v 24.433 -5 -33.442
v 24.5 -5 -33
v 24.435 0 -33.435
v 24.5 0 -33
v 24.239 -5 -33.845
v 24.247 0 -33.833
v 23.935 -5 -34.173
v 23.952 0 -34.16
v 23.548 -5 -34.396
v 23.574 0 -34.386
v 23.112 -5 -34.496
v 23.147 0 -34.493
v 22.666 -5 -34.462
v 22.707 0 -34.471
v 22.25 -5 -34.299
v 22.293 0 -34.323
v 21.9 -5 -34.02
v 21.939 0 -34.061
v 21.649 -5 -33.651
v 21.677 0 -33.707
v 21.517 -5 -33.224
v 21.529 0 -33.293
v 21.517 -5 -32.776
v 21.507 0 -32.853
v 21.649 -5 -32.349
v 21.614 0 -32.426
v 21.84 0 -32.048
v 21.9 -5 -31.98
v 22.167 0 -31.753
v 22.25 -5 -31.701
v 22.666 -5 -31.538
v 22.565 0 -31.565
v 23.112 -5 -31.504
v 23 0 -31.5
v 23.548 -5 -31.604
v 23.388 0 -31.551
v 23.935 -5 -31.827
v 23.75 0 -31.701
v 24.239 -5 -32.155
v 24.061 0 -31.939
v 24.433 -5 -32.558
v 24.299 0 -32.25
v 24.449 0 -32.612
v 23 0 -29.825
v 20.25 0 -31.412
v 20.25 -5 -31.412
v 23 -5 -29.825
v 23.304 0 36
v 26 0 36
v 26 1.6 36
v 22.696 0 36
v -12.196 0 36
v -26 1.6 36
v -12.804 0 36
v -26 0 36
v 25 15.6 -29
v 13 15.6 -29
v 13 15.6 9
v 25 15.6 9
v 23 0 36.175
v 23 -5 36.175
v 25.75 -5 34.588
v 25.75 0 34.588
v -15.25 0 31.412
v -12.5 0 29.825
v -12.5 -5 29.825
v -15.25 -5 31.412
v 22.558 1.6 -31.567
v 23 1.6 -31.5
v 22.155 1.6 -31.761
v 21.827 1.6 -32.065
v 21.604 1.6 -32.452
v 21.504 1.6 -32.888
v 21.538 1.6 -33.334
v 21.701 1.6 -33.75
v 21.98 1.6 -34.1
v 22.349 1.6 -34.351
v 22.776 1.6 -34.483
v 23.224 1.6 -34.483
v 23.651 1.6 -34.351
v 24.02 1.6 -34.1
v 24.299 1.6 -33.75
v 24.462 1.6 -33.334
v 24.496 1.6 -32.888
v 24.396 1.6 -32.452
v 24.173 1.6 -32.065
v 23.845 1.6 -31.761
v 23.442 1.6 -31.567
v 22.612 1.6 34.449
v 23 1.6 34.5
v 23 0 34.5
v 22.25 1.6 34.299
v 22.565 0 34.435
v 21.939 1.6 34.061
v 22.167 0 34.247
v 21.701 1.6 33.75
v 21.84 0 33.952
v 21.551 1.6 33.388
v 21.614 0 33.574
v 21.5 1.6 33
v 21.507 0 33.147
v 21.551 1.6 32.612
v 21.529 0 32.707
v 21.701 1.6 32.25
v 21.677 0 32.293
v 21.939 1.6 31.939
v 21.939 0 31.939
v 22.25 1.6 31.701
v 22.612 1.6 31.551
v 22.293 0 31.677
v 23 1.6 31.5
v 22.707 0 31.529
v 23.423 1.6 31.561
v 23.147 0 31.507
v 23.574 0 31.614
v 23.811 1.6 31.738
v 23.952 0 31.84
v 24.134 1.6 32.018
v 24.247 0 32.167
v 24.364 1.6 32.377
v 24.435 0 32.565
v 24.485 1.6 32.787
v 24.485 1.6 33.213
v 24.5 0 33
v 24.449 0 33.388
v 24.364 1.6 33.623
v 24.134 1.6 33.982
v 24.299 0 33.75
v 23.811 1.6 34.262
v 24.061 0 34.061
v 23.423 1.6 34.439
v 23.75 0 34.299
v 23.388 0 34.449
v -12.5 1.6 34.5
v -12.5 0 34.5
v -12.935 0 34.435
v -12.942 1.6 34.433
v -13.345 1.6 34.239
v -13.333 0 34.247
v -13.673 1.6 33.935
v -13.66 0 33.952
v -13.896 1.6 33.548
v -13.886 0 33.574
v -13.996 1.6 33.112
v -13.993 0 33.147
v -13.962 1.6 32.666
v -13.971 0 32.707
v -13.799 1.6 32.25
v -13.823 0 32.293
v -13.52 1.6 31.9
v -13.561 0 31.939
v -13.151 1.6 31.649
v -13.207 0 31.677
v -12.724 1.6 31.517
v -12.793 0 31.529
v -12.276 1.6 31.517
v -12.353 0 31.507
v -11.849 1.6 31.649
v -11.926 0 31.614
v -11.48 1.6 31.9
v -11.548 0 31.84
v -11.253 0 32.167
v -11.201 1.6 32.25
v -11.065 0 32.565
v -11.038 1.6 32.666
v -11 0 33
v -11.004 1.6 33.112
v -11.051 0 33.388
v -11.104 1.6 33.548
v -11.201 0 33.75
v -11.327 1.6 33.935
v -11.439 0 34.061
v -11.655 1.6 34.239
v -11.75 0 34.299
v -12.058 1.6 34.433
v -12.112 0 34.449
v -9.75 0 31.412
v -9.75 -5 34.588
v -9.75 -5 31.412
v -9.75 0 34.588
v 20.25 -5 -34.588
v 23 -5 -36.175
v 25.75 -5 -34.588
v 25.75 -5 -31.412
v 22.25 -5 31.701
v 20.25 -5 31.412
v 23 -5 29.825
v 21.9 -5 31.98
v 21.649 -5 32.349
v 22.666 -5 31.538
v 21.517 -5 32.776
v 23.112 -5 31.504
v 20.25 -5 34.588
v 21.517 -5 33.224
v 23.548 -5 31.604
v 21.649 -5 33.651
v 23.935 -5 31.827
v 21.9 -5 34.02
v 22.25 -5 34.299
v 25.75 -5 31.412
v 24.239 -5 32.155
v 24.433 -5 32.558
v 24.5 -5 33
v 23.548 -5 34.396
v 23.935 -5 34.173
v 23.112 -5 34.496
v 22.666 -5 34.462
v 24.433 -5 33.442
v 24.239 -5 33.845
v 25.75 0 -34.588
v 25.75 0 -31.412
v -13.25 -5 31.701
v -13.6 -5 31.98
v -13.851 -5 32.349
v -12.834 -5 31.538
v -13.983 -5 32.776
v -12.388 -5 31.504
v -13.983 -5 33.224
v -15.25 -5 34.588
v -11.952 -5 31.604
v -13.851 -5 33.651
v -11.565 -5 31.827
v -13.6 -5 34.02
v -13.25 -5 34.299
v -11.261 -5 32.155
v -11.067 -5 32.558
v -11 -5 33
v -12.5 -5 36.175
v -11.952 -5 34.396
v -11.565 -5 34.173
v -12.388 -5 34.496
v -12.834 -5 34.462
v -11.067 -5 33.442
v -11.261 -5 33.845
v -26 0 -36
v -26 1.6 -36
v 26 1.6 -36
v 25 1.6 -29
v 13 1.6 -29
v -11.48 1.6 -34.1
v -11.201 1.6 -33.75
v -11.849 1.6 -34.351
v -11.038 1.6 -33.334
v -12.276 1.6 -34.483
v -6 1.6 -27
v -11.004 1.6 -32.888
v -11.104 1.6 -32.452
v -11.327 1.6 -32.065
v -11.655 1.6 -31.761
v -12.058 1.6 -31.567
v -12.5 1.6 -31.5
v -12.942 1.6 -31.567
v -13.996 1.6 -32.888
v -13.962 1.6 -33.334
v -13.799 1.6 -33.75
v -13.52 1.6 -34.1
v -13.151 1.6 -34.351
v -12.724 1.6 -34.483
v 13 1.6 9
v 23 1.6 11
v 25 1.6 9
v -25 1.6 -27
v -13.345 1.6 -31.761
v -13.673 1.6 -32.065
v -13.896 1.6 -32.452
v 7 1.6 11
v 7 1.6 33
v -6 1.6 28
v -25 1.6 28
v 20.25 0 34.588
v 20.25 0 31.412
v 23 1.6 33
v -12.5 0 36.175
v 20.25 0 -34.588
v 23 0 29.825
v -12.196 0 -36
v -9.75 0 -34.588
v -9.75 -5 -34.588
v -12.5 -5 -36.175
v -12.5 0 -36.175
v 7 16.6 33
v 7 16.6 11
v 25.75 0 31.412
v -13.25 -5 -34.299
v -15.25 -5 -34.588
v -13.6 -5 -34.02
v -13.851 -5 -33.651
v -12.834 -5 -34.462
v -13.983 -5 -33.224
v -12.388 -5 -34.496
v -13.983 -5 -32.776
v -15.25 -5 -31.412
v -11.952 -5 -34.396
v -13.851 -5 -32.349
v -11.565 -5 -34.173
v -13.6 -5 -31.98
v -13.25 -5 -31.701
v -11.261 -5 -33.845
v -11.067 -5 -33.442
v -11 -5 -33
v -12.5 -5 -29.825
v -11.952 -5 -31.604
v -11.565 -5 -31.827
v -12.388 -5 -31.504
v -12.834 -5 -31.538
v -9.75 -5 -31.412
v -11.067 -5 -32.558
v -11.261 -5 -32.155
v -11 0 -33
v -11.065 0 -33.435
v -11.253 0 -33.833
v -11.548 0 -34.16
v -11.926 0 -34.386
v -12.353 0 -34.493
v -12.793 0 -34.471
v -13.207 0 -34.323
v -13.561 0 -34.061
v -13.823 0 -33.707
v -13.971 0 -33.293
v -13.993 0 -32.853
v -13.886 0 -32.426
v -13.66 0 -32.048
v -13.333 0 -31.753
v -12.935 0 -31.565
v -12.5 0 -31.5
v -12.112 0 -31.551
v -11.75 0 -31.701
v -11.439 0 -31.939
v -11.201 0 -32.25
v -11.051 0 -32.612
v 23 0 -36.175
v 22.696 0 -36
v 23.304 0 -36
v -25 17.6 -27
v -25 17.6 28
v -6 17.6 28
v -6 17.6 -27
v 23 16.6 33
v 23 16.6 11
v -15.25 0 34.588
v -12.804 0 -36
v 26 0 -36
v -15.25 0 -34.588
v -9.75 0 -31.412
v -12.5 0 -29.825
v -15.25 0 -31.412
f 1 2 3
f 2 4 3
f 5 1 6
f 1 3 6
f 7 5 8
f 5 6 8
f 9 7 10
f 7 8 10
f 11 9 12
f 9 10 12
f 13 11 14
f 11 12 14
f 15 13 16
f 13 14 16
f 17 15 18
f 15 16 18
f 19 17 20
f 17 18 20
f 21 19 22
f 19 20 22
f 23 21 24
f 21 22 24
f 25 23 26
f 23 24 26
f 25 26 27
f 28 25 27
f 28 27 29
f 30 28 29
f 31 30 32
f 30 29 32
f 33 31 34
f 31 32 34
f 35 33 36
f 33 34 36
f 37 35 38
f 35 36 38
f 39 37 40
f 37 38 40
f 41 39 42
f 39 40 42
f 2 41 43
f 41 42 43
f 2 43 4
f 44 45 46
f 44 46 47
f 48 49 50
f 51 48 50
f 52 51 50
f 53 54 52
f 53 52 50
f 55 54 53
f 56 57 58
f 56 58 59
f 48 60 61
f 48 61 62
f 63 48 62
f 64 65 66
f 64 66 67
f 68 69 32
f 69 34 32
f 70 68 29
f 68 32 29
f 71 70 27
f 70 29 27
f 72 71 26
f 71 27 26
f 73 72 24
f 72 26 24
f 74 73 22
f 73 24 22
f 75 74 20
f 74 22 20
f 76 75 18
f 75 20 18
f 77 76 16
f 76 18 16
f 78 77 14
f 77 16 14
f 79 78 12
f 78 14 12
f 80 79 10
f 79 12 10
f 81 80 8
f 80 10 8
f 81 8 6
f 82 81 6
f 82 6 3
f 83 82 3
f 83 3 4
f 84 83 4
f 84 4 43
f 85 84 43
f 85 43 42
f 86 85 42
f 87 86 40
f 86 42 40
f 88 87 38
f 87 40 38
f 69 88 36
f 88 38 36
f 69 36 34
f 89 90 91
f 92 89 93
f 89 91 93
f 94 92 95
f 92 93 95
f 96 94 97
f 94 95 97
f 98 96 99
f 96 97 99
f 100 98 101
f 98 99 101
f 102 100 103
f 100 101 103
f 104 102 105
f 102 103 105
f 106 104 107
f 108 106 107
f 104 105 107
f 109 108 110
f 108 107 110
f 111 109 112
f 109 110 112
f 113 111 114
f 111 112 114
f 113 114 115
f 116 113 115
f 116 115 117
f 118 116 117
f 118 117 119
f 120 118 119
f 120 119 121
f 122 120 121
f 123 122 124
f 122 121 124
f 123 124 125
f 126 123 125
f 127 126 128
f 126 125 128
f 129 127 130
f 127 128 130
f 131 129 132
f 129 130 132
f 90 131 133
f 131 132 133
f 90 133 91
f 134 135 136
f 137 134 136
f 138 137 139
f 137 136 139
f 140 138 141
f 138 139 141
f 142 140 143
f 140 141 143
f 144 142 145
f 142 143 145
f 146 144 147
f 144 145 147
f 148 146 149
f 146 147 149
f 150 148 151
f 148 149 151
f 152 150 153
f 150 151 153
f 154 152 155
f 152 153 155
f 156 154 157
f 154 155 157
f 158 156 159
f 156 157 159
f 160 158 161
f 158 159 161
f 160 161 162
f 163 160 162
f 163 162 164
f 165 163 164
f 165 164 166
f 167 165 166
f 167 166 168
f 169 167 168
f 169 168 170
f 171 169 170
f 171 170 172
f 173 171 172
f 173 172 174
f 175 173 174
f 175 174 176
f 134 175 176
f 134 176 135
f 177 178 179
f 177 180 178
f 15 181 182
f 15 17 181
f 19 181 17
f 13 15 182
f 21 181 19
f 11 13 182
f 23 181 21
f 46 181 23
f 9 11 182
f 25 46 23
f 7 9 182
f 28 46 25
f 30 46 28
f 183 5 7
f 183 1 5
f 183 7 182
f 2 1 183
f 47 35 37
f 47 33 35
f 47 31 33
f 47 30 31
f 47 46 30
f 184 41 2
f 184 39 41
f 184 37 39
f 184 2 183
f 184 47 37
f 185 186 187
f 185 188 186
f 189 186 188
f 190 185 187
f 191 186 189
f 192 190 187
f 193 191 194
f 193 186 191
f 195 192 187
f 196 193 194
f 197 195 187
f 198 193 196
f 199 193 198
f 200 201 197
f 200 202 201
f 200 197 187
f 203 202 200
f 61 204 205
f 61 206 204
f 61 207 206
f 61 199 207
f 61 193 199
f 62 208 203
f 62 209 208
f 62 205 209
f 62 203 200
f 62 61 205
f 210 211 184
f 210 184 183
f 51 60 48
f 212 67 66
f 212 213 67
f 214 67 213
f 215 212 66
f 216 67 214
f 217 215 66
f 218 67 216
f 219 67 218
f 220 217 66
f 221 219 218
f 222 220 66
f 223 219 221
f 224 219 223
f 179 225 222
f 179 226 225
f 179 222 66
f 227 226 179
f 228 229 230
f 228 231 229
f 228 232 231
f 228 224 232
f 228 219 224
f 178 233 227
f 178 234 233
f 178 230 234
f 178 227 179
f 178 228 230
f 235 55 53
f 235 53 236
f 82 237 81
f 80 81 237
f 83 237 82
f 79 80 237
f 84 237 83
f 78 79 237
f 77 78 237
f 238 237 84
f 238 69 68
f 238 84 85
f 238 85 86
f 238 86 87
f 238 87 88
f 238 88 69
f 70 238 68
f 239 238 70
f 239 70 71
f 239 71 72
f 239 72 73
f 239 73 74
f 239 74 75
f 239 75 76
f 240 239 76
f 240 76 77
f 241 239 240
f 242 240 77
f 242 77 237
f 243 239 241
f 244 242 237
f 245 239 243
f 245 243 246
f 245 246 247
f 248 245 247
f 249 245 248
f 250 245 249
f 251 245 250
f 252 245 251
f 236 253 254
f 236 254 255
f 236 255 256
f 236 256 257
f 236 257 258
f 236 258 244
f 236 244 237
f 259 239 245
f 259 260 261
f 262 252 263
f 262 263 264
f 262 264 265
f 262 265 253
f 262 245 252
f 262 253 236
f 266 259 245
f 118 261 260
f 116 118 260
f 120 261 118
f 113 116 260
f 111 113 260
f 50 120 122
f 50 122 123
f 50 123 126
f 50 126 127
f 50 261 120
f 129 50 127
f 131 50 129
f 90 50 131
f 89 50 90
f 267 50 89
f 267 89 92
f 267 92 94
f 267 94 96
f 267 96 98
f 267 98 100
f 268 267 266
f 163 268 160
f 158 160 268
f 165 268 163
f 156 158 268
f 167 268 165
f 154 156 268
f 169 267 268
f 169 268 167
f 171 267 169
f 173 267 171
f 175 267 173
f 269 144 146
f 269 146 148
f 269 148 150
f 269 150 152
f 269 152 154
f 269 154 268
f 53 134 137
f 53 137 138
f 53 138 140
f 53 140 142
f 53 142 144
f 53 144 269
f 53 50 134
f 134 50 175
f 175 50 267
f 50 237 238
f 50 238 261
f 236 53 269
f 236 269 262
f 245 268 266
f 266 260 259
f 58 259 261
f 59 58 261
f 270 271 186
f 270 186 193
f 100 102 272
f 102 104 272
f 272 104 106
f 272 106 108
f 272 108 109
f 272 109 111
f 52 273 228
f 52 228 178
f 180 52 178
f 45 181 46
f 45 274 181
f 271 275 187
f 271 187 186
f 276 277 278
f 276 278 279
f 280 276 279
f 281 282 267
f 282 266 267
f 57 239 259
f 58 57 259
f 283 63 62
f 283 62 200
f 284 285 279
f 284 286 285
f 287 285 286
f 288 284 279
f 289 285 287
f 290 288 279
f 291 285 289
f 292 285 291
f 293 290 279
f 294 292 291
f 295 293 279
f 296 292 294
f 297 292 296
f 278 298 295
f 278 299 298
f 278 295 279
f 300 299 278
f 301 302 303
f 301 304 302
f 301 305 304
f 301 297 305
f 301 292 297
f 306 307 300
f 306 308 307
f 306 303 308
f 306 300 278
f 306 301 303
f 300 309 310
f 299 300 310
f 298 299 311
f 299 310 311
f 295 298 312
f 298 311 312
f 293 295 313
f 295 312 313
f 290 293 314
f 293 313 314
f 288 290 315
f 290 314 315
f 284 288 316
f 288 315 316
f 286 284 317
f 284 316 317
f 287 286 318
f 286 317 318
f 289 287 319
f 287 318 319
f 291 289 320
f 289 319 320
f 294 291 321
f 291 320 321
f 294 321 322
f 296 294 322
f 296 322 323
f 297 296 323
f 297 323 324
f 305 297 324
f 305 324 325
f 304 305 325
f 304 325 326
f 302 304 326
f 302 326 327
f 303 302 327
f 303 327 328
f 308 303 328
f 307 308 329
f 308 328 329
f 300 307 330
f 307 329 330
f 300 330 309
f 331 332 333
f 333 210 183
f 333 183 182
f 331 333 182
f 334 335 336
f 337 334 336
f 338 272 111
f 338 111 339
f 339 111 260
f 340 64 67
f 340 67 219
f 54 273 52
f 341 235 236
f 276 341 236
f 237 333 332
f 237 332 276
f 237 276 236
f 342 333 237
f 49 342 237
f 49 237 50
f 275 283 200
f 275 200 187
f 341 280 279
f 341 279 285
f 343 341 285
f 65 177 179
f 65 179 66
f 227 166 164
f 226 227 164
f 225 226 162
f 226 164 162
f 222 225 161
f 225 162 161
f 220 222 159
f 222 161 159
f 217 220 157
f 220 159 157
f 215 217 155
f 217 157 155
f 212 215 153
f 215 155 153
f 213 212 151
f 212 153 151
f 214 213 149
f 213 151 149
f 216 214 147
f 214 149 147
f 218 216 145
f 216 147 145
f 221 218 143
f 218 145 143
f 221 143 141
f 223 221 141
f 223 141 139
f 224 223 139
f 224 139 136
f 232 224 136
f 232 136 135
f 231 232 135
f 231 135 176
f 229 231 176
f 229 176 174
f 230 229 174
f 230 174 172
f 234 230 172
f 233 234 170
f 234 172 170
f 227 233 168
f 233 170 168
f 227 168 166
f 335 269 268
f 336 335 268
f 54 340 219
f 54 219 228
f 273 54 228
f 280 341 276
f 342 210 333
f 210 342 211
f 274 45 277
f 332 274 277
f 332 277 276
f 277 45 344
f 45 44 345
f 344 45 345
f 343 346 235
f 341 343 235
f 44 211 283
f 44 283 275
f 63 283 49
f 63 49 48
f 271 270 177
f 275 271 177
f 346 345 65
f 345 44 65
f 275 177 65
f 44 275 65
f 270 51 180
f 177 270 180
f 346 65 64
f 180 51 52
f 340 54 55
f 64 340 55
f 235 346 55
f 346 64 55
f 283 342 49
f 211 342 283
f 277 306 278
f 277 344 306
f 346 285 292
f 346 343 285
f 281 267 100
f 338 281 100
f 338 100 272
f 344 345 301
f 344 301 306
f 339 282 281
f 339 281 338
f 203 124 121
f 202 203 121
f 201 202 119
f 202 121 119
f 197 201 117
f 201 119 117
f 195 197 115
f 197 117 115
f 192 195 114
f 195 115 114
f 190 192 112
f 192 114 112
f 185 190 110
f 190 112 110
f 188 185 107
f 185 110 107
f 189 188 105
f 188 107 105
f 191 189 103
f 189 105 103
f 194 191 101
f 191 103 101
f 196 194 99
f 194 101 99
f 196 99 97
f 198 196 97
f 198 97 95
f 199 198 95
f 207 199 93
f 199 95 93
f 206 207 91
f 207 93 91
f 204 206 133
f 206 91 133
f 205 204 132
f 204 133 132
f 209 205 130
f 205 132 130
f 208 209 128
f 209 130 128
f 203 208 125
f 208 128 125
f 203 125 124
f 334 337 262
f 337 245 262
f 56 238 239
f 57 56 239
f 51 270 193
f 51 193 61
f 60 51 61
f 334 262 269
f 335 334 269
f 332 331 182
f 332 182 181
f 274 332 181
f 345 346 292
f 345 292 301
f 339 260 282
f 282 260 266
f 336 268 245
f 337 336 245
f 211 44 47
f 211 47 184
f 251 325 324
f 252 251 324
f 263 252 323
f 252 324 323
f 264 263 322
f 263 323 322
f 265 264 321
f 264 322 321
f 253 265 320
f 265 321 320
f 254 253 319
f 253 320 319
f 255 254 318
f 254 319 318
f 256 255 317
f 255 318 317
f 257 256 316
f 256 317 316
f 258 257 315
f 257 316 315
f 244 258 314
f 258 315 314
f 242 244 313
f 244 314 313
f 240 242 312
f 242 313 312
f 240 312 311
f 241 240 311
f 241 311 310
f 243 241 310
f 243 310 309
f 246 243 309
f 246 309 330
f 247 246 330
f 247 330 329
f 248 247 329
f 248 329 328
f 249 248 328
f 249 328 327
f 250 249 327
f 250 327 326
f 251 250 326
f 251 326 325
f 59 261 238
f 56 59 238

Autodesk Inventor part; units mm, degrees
ref_plane "YZ Plane" through (0, 0, 0) normal (1, 0, 0) x (0, 1, 0)
ref_plane "XZ Plane" through (0, 0, 0) normal (0, 1, 0) x (-1, 0, 0)
ref_plane "XY Plane" through (0, 0, 0) normal (0, 0, 1) x (1, 0, 0)
sketch "Sketch1" plane through (0, 0, 0) normal (0, 1, 0) x (-1, 0, 0)
  line L0 (-26, 36) -> (26, 36)
  line L1 (26, 36) -> (26, -36)
  line L2 (26, -36) -> (-26, -36)
  line L3 (-26, -36) -> (-26, 36)
  line L4 (-26, 36) -> (26, -36) construction
  line L5 (26, 36) -> (-26, -36) construction
  point P0 (0, 0)
  dimension "d0" = 72
  dimension "d1" = 52
extrude "Extrusion1" add sketch "Sketch1" along normal blind 1.6
sketch "Sketch2" plane through (0, 1.6, 0) normal (0, 1, 0) x (1, 0, 0)
  line L0 (-12.5, -33) -> (23, -33) construction
  line L1 (23, -33) -> (23, 33) construction
  line L2 (23, 33) -> (-12.5, 33) construction
  line L3 (-12.5, 33) -> (-12.5, -33) construction
  line L4 (-12.5, -33) -> (23, 33) construction
  line L5 (23, -33) -> (-12.5, 33) construction
  line L6 (26, 36) -> (-26, 36) construction
  line L7 (-26, -36) -> (26, -36) construction
  line L8 (26, -36) -> (26, 36) construction
  line L9 (26, 36) -> (-26, 36) construction
  line L10 (-26, 36) -> (-26, -36) construction
  point P0 (0, 0)
  point P1 (5.25, 0)
  dimension "d4" = 66
  dimension "d5" = 35.5
  dimension "d6" = 3
  dimension "d7" = 3
hole "Hole1" at (-12.5, 1.6, 33) at (-12.5, 1.6, -33) at (23, 1.6, -33) at (23, 1.6, 33) direction (0, -1, 0) diameter 3 end through all
sketch "Sketch3" plane through (0, 1.6, 0) normal (0, 1, 0) x (1, 0, 0)
  line L0 (13, -9) -> (25, -9)
  line L1 (25, -9) -> (25, 29)
  line L2 (25, 29) -> (13, 29)
  line L3 (13, 29) -> (13, -9)
  circle A0 centre (23, 33) radius 1.5 construction
  line L4 (26, -36) -> (26, 36) construction
  point P0 (0, 0)
  dimension "d15" = 38
  dimension "d16" = 12
  dimension "d18" = 4
  dimension "d19" = 1
extrude "Extrusion2" add sketch "Sketch3" along normal blind 14
sketch "Sketch4" plane through (0, 1.6, 0) normal (0, 1, 0) x (1, 0, 0)
  line L0 (7, -33) -> (23, -33)
  line L1 (23, -33) -> (23, -11)
  line L2 (23, -11) -> (7, -11)
  line L3 (7, -11) -> (7, -33)
  line L4 (13, -9) -> (13, 29) construction
  line L5 (13, 29) -> (25, 29) construction
  line L6 (25, 29) -> (25, -9) construction
  line L7 (25, -9) -> (13, -9) construction
  circle A0 centre (23, 33) radius 1.5 construction
  circle A1 centre (-12.5, -33) radius 1.5 construction
  circle A2 centre (-12.5, 33) radius 1.5 construction
  circle A3 centre (23, -33) radius 1.5 construction
  line L8 (-26, -36) -> (26, -36) construction
  line L9 (26, -36) -> (26, 36) construction
  line L10 (26, 36) -> (-26, 36) construction
  line L11 (-26, 36) -> (-26, -36) construction
  point P0 (0, 0)
  dimension "d22" = 22
  dimension "d23" = 16
extrude "Extrusion3" add sketch "Sketch4" along normal blind 15
sketch "Sketch5" plane through (0, 1.6, 0) normal (0, 1, 0) x (1, 0, 0)
  line L0 (-25, -28) -> (-6, -28)
  line L1 (-6, -28) -> (-6, 27)
  line L2 (-6, 27) -> (-25, 27)
  line L3 (-25, 27) -> (-25, -28)
  line L4 (-26, -36) -> (26, -36) projected
  line L5 (-26, 36) -> (-26, -36) projected
  point P0 (0, 0)
  dimension "d26" = 55
  dimension "d27" = 19
  dimension "d28" = 8
  dimension "d29" = 1
extrude "Extrusion4" add sketch "Sketch5" along normal blind 16
sketch "Sketch6" plane through (0, 0, 0) normal (0, -1, 0) x (1, 0, 0)
  circle A0 centre (23, 33) radius 1.5 projected
  circle A1 centre (23, -33) radius 1.5 projected
  circle A2 centre (-12.5, -33) radius 1.5 projected
  circle A3 centre (-12.5, 33) radius 1.5 projected
  line L0 (25.75, 31.4123) -> (23, 29.8246)
  line L1 (23, 29.8246) -> (20.25, 31.4123)
  line L2 (20.25, 31.4123) -> (20.25, 34.5877)
  line L3 (20.25, 34.5877) -> (23, 36.1754)
  line L4 (23, 36.1754) -> (25.75, 34.5877)
  line L5 (25.75, 34.5877) -> (25.75, 31.4123)
  line L6 (20.25, -31.4123) -> (23, -29.8246)
  line L7 (23, -29.8246) -> (25.75, -31.4123)
  line L8 (25.75, -31.4123) -> (25.75, -34.5877)
  line L9 (25.75, -34.5877) -> (23, -36.1754)
  line L10 (23, -36.1754) -> (20.25, -34.5877)
  line L11 (20.25, -34.5877) -> (20.25, -31.4123)
  line L12 (-9.75, 31.4123) -> (-12.5, 29.8246)
  line L13 (-12.5, 29.8246) -> (-15.25, 31.4123)
  line L14 (-15.25, 31.4123) -> (-15.25, 34.5877)
  line L15 (-15.25, 34.5877) -> (-12.5, 36.1754)
  line L16 (-12.5, 36.1754) -> (-9.75, 34.5877)
  line L17 (-9.75, 34.5877) -> (-9.75, 31.4123)
  line L18 (-9.75, -31.4123) -> (-9.75, -34.5877)
  line L19 (-9.75, -34.5877) -> (-12.5, -36.1754)
  line L20 (-12.5, -36.1754) -> (-15.25, -34.5877)
  line L21 (-15.25, -34.5877) -> (-15.25, -31.4123)
  line L22 (-15.25, -31.4123) -> (-12.5, -29.8246)
  line L23 (-12.5, -29.8246) -> (-9.75, -31.4123)
  line L24 (26, -36) -> (26, 36) projected
  line L25 (-26, 36) -> (-26, -36) projected
  point P0 (0, 0)
  dimension "d32" = 5.5
  dimension "d33" = 5.5
  dimension "d34" = 5.5
  dimension "d35" = 5.5
extrude "Extrusion5" add sketch "Sketch6" along normal blind 5
properties part number "backboard"
